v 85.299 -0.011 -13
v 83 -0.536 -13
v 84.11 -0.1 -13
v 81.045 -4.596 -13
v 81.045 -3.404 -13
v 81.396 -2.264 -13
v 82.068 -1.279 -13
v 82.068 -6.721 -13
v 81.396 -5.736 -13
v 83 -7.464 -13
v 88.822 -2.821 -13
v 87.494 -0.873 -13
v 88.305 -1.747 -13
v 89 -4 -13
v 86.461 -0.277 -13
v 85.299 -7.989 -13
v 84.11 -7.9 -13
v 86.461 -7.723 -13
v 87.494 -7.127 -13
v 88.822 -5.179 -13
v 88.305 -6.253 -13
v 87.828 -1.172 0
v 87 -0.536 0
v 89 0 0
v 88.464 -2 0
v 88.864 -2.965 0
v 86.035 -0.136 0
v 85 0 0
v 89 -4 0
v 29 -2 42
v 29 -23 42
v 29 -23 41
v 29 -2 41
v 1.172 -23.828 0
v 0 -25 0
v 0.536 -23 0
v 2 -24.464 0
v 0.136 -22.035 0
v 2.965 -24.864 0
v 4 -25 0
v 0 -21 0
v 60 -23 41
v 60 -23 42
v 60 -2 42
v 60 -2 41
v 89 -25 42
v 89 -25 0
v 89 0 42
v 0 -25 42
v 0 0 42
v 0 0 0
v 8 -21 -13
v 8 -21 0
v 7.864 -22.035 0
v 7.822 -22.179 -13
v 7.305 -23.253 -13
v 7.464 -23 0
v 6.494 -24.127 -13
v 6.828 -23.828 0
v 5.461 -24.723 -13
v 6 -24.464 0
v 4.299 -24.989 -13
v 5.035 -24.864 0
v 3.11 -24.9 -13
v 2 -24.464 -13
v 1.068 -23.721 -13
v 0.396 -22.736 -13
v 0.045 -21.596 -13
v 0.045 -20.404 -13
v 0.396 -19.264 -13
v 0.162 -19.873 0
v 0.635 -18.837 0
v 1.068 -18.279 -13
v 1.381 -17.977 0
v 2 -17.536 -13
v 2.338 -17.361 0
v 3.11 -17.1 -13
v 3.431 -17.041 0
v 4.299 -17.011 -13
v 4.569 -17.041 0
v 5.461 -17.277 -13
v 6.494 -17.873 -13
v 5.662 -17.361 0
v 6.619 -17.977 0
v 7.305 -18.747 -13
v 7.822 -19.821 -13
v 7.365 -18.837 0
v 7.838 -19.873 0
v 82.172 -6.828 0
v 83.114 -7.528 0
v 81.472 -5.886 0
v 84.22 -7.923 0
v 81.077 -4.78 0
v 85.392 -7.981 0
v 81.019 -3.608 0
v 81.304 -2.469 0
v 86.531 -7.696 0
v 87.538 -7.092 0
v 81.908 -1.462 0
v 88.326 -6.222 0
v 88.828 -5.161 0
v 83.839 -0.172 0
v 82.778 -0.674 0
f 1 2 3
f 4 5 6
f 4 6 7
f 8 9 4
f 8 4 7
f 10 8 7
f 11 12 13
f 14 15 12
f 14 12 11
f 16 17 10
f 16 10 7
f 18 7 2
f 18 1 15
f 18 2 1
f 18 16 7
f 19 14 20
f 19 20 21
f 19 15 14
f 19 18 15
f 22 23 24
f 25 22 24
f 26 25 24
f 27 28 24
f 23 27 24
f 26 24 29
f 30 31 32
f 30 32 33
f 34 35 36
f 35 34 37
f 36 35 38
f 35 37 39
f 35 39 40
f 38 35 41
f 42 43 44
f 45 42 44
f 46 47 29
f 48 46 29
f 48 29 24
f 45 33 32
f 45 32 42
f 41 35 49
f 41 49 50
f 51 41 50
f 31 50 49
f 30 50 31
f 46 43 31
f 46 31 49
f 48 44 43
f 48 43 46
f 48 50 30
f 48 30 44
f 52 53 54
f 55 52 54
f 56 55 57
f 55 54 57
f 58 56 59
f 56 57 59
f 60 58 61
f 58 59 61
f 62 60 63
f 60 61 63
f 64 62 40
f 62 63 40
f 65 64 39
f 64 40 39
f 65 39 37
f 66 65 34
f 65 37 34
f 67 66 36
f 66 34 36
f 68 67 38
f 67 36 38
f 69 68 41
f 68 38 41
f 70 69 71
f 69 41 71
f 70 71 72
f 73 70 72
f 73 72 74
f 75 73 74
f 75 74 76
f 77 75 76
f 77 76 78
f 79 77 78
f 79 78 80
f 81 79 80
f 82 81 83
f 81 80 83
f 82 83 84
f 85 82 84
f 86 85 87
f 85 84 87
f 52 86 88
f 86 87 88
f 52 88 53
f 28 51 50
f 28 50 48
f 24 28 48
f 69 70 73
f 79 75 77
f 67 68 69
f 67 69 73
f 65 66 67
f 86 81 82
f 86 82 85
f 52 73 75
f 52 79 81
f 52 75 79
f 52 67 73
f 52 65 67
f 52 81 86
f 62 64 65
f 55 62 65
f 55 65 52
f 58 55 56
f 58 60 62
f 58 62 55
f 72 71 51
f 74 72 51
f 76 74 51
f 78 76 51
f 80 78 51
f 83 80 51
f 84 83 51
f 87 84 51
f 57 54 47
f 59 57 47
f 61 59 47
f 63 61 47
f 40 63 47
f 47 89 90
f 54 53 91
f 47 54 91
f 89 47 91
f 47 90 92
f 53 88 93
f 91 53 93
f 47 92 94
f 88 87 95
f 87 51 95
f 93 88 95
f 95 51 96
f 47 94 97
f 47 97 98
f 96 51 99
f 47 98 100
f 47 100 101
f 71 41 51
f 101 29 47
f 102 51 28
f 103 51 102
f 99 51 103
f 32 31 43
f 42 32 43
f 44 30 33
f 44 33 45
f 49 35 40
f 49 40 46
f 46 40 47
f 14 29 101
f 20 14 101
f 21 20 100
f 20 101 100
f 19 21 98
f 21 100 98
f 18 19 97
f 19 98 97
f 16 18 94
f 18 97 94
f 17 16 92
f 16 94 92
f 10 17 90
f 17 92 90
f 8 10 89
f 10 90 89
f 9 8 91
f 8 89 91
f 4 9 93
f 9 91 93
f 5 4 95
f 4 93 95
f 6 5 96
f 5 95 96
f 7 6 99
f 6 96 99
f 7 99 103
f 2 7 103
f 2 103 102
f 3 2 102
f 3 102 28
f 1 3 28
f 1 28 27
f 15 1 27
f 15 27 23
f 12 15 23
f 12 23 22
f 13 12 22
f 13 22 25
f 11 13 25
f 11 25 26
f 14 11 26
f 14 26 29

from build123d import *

# Parameters (mm, degrees)
SKETCH_W     = 89
SKETCH_H     = 25
PAD_DEPTH    = 42
SKETCH001_R  = 4
PAD001_DEPTH = 13
SKETCH002_W  = 31
SKETCH002_H  = 21
POCKET_DEPTH = 1


with BuildPart() as part:
    # Sketch → Pad (new body)
    with BuildSketch(Plane.XY):
        with Locations((44.5, -12.5)):
            Rectangle(SKETCH_W, SKETCH_H)
    extrude(amount=PAD_DEPTH)

    # Sketch001 (on Face5 of Pad) → Pad001 (join)
    with BuildSketch(Plane(origin=(0, 0, 0), x_dir=(1, 0, 0), z_dir=(0, 0, -1))):
        with Locations((85, 4)):
            Circle(SKETCH001_R)
        with Locations((4, 21)):
            Circle(SKETCH001_R)
    extrude(amount=PAD001_DEPTH)

    # Sketch002 (on Face6 of Pad001) → Pocket (cut)
    with BuildSketch(Plane.XY.offset(42)):
        with Locations((44.5, -12.5)):
            Rectangle(SKETCH002_W, SKETCH002_H)
    extrude(amount=-POCKET_DEPTH, mode=Mode.SUBTRACT)


solid = part.part
